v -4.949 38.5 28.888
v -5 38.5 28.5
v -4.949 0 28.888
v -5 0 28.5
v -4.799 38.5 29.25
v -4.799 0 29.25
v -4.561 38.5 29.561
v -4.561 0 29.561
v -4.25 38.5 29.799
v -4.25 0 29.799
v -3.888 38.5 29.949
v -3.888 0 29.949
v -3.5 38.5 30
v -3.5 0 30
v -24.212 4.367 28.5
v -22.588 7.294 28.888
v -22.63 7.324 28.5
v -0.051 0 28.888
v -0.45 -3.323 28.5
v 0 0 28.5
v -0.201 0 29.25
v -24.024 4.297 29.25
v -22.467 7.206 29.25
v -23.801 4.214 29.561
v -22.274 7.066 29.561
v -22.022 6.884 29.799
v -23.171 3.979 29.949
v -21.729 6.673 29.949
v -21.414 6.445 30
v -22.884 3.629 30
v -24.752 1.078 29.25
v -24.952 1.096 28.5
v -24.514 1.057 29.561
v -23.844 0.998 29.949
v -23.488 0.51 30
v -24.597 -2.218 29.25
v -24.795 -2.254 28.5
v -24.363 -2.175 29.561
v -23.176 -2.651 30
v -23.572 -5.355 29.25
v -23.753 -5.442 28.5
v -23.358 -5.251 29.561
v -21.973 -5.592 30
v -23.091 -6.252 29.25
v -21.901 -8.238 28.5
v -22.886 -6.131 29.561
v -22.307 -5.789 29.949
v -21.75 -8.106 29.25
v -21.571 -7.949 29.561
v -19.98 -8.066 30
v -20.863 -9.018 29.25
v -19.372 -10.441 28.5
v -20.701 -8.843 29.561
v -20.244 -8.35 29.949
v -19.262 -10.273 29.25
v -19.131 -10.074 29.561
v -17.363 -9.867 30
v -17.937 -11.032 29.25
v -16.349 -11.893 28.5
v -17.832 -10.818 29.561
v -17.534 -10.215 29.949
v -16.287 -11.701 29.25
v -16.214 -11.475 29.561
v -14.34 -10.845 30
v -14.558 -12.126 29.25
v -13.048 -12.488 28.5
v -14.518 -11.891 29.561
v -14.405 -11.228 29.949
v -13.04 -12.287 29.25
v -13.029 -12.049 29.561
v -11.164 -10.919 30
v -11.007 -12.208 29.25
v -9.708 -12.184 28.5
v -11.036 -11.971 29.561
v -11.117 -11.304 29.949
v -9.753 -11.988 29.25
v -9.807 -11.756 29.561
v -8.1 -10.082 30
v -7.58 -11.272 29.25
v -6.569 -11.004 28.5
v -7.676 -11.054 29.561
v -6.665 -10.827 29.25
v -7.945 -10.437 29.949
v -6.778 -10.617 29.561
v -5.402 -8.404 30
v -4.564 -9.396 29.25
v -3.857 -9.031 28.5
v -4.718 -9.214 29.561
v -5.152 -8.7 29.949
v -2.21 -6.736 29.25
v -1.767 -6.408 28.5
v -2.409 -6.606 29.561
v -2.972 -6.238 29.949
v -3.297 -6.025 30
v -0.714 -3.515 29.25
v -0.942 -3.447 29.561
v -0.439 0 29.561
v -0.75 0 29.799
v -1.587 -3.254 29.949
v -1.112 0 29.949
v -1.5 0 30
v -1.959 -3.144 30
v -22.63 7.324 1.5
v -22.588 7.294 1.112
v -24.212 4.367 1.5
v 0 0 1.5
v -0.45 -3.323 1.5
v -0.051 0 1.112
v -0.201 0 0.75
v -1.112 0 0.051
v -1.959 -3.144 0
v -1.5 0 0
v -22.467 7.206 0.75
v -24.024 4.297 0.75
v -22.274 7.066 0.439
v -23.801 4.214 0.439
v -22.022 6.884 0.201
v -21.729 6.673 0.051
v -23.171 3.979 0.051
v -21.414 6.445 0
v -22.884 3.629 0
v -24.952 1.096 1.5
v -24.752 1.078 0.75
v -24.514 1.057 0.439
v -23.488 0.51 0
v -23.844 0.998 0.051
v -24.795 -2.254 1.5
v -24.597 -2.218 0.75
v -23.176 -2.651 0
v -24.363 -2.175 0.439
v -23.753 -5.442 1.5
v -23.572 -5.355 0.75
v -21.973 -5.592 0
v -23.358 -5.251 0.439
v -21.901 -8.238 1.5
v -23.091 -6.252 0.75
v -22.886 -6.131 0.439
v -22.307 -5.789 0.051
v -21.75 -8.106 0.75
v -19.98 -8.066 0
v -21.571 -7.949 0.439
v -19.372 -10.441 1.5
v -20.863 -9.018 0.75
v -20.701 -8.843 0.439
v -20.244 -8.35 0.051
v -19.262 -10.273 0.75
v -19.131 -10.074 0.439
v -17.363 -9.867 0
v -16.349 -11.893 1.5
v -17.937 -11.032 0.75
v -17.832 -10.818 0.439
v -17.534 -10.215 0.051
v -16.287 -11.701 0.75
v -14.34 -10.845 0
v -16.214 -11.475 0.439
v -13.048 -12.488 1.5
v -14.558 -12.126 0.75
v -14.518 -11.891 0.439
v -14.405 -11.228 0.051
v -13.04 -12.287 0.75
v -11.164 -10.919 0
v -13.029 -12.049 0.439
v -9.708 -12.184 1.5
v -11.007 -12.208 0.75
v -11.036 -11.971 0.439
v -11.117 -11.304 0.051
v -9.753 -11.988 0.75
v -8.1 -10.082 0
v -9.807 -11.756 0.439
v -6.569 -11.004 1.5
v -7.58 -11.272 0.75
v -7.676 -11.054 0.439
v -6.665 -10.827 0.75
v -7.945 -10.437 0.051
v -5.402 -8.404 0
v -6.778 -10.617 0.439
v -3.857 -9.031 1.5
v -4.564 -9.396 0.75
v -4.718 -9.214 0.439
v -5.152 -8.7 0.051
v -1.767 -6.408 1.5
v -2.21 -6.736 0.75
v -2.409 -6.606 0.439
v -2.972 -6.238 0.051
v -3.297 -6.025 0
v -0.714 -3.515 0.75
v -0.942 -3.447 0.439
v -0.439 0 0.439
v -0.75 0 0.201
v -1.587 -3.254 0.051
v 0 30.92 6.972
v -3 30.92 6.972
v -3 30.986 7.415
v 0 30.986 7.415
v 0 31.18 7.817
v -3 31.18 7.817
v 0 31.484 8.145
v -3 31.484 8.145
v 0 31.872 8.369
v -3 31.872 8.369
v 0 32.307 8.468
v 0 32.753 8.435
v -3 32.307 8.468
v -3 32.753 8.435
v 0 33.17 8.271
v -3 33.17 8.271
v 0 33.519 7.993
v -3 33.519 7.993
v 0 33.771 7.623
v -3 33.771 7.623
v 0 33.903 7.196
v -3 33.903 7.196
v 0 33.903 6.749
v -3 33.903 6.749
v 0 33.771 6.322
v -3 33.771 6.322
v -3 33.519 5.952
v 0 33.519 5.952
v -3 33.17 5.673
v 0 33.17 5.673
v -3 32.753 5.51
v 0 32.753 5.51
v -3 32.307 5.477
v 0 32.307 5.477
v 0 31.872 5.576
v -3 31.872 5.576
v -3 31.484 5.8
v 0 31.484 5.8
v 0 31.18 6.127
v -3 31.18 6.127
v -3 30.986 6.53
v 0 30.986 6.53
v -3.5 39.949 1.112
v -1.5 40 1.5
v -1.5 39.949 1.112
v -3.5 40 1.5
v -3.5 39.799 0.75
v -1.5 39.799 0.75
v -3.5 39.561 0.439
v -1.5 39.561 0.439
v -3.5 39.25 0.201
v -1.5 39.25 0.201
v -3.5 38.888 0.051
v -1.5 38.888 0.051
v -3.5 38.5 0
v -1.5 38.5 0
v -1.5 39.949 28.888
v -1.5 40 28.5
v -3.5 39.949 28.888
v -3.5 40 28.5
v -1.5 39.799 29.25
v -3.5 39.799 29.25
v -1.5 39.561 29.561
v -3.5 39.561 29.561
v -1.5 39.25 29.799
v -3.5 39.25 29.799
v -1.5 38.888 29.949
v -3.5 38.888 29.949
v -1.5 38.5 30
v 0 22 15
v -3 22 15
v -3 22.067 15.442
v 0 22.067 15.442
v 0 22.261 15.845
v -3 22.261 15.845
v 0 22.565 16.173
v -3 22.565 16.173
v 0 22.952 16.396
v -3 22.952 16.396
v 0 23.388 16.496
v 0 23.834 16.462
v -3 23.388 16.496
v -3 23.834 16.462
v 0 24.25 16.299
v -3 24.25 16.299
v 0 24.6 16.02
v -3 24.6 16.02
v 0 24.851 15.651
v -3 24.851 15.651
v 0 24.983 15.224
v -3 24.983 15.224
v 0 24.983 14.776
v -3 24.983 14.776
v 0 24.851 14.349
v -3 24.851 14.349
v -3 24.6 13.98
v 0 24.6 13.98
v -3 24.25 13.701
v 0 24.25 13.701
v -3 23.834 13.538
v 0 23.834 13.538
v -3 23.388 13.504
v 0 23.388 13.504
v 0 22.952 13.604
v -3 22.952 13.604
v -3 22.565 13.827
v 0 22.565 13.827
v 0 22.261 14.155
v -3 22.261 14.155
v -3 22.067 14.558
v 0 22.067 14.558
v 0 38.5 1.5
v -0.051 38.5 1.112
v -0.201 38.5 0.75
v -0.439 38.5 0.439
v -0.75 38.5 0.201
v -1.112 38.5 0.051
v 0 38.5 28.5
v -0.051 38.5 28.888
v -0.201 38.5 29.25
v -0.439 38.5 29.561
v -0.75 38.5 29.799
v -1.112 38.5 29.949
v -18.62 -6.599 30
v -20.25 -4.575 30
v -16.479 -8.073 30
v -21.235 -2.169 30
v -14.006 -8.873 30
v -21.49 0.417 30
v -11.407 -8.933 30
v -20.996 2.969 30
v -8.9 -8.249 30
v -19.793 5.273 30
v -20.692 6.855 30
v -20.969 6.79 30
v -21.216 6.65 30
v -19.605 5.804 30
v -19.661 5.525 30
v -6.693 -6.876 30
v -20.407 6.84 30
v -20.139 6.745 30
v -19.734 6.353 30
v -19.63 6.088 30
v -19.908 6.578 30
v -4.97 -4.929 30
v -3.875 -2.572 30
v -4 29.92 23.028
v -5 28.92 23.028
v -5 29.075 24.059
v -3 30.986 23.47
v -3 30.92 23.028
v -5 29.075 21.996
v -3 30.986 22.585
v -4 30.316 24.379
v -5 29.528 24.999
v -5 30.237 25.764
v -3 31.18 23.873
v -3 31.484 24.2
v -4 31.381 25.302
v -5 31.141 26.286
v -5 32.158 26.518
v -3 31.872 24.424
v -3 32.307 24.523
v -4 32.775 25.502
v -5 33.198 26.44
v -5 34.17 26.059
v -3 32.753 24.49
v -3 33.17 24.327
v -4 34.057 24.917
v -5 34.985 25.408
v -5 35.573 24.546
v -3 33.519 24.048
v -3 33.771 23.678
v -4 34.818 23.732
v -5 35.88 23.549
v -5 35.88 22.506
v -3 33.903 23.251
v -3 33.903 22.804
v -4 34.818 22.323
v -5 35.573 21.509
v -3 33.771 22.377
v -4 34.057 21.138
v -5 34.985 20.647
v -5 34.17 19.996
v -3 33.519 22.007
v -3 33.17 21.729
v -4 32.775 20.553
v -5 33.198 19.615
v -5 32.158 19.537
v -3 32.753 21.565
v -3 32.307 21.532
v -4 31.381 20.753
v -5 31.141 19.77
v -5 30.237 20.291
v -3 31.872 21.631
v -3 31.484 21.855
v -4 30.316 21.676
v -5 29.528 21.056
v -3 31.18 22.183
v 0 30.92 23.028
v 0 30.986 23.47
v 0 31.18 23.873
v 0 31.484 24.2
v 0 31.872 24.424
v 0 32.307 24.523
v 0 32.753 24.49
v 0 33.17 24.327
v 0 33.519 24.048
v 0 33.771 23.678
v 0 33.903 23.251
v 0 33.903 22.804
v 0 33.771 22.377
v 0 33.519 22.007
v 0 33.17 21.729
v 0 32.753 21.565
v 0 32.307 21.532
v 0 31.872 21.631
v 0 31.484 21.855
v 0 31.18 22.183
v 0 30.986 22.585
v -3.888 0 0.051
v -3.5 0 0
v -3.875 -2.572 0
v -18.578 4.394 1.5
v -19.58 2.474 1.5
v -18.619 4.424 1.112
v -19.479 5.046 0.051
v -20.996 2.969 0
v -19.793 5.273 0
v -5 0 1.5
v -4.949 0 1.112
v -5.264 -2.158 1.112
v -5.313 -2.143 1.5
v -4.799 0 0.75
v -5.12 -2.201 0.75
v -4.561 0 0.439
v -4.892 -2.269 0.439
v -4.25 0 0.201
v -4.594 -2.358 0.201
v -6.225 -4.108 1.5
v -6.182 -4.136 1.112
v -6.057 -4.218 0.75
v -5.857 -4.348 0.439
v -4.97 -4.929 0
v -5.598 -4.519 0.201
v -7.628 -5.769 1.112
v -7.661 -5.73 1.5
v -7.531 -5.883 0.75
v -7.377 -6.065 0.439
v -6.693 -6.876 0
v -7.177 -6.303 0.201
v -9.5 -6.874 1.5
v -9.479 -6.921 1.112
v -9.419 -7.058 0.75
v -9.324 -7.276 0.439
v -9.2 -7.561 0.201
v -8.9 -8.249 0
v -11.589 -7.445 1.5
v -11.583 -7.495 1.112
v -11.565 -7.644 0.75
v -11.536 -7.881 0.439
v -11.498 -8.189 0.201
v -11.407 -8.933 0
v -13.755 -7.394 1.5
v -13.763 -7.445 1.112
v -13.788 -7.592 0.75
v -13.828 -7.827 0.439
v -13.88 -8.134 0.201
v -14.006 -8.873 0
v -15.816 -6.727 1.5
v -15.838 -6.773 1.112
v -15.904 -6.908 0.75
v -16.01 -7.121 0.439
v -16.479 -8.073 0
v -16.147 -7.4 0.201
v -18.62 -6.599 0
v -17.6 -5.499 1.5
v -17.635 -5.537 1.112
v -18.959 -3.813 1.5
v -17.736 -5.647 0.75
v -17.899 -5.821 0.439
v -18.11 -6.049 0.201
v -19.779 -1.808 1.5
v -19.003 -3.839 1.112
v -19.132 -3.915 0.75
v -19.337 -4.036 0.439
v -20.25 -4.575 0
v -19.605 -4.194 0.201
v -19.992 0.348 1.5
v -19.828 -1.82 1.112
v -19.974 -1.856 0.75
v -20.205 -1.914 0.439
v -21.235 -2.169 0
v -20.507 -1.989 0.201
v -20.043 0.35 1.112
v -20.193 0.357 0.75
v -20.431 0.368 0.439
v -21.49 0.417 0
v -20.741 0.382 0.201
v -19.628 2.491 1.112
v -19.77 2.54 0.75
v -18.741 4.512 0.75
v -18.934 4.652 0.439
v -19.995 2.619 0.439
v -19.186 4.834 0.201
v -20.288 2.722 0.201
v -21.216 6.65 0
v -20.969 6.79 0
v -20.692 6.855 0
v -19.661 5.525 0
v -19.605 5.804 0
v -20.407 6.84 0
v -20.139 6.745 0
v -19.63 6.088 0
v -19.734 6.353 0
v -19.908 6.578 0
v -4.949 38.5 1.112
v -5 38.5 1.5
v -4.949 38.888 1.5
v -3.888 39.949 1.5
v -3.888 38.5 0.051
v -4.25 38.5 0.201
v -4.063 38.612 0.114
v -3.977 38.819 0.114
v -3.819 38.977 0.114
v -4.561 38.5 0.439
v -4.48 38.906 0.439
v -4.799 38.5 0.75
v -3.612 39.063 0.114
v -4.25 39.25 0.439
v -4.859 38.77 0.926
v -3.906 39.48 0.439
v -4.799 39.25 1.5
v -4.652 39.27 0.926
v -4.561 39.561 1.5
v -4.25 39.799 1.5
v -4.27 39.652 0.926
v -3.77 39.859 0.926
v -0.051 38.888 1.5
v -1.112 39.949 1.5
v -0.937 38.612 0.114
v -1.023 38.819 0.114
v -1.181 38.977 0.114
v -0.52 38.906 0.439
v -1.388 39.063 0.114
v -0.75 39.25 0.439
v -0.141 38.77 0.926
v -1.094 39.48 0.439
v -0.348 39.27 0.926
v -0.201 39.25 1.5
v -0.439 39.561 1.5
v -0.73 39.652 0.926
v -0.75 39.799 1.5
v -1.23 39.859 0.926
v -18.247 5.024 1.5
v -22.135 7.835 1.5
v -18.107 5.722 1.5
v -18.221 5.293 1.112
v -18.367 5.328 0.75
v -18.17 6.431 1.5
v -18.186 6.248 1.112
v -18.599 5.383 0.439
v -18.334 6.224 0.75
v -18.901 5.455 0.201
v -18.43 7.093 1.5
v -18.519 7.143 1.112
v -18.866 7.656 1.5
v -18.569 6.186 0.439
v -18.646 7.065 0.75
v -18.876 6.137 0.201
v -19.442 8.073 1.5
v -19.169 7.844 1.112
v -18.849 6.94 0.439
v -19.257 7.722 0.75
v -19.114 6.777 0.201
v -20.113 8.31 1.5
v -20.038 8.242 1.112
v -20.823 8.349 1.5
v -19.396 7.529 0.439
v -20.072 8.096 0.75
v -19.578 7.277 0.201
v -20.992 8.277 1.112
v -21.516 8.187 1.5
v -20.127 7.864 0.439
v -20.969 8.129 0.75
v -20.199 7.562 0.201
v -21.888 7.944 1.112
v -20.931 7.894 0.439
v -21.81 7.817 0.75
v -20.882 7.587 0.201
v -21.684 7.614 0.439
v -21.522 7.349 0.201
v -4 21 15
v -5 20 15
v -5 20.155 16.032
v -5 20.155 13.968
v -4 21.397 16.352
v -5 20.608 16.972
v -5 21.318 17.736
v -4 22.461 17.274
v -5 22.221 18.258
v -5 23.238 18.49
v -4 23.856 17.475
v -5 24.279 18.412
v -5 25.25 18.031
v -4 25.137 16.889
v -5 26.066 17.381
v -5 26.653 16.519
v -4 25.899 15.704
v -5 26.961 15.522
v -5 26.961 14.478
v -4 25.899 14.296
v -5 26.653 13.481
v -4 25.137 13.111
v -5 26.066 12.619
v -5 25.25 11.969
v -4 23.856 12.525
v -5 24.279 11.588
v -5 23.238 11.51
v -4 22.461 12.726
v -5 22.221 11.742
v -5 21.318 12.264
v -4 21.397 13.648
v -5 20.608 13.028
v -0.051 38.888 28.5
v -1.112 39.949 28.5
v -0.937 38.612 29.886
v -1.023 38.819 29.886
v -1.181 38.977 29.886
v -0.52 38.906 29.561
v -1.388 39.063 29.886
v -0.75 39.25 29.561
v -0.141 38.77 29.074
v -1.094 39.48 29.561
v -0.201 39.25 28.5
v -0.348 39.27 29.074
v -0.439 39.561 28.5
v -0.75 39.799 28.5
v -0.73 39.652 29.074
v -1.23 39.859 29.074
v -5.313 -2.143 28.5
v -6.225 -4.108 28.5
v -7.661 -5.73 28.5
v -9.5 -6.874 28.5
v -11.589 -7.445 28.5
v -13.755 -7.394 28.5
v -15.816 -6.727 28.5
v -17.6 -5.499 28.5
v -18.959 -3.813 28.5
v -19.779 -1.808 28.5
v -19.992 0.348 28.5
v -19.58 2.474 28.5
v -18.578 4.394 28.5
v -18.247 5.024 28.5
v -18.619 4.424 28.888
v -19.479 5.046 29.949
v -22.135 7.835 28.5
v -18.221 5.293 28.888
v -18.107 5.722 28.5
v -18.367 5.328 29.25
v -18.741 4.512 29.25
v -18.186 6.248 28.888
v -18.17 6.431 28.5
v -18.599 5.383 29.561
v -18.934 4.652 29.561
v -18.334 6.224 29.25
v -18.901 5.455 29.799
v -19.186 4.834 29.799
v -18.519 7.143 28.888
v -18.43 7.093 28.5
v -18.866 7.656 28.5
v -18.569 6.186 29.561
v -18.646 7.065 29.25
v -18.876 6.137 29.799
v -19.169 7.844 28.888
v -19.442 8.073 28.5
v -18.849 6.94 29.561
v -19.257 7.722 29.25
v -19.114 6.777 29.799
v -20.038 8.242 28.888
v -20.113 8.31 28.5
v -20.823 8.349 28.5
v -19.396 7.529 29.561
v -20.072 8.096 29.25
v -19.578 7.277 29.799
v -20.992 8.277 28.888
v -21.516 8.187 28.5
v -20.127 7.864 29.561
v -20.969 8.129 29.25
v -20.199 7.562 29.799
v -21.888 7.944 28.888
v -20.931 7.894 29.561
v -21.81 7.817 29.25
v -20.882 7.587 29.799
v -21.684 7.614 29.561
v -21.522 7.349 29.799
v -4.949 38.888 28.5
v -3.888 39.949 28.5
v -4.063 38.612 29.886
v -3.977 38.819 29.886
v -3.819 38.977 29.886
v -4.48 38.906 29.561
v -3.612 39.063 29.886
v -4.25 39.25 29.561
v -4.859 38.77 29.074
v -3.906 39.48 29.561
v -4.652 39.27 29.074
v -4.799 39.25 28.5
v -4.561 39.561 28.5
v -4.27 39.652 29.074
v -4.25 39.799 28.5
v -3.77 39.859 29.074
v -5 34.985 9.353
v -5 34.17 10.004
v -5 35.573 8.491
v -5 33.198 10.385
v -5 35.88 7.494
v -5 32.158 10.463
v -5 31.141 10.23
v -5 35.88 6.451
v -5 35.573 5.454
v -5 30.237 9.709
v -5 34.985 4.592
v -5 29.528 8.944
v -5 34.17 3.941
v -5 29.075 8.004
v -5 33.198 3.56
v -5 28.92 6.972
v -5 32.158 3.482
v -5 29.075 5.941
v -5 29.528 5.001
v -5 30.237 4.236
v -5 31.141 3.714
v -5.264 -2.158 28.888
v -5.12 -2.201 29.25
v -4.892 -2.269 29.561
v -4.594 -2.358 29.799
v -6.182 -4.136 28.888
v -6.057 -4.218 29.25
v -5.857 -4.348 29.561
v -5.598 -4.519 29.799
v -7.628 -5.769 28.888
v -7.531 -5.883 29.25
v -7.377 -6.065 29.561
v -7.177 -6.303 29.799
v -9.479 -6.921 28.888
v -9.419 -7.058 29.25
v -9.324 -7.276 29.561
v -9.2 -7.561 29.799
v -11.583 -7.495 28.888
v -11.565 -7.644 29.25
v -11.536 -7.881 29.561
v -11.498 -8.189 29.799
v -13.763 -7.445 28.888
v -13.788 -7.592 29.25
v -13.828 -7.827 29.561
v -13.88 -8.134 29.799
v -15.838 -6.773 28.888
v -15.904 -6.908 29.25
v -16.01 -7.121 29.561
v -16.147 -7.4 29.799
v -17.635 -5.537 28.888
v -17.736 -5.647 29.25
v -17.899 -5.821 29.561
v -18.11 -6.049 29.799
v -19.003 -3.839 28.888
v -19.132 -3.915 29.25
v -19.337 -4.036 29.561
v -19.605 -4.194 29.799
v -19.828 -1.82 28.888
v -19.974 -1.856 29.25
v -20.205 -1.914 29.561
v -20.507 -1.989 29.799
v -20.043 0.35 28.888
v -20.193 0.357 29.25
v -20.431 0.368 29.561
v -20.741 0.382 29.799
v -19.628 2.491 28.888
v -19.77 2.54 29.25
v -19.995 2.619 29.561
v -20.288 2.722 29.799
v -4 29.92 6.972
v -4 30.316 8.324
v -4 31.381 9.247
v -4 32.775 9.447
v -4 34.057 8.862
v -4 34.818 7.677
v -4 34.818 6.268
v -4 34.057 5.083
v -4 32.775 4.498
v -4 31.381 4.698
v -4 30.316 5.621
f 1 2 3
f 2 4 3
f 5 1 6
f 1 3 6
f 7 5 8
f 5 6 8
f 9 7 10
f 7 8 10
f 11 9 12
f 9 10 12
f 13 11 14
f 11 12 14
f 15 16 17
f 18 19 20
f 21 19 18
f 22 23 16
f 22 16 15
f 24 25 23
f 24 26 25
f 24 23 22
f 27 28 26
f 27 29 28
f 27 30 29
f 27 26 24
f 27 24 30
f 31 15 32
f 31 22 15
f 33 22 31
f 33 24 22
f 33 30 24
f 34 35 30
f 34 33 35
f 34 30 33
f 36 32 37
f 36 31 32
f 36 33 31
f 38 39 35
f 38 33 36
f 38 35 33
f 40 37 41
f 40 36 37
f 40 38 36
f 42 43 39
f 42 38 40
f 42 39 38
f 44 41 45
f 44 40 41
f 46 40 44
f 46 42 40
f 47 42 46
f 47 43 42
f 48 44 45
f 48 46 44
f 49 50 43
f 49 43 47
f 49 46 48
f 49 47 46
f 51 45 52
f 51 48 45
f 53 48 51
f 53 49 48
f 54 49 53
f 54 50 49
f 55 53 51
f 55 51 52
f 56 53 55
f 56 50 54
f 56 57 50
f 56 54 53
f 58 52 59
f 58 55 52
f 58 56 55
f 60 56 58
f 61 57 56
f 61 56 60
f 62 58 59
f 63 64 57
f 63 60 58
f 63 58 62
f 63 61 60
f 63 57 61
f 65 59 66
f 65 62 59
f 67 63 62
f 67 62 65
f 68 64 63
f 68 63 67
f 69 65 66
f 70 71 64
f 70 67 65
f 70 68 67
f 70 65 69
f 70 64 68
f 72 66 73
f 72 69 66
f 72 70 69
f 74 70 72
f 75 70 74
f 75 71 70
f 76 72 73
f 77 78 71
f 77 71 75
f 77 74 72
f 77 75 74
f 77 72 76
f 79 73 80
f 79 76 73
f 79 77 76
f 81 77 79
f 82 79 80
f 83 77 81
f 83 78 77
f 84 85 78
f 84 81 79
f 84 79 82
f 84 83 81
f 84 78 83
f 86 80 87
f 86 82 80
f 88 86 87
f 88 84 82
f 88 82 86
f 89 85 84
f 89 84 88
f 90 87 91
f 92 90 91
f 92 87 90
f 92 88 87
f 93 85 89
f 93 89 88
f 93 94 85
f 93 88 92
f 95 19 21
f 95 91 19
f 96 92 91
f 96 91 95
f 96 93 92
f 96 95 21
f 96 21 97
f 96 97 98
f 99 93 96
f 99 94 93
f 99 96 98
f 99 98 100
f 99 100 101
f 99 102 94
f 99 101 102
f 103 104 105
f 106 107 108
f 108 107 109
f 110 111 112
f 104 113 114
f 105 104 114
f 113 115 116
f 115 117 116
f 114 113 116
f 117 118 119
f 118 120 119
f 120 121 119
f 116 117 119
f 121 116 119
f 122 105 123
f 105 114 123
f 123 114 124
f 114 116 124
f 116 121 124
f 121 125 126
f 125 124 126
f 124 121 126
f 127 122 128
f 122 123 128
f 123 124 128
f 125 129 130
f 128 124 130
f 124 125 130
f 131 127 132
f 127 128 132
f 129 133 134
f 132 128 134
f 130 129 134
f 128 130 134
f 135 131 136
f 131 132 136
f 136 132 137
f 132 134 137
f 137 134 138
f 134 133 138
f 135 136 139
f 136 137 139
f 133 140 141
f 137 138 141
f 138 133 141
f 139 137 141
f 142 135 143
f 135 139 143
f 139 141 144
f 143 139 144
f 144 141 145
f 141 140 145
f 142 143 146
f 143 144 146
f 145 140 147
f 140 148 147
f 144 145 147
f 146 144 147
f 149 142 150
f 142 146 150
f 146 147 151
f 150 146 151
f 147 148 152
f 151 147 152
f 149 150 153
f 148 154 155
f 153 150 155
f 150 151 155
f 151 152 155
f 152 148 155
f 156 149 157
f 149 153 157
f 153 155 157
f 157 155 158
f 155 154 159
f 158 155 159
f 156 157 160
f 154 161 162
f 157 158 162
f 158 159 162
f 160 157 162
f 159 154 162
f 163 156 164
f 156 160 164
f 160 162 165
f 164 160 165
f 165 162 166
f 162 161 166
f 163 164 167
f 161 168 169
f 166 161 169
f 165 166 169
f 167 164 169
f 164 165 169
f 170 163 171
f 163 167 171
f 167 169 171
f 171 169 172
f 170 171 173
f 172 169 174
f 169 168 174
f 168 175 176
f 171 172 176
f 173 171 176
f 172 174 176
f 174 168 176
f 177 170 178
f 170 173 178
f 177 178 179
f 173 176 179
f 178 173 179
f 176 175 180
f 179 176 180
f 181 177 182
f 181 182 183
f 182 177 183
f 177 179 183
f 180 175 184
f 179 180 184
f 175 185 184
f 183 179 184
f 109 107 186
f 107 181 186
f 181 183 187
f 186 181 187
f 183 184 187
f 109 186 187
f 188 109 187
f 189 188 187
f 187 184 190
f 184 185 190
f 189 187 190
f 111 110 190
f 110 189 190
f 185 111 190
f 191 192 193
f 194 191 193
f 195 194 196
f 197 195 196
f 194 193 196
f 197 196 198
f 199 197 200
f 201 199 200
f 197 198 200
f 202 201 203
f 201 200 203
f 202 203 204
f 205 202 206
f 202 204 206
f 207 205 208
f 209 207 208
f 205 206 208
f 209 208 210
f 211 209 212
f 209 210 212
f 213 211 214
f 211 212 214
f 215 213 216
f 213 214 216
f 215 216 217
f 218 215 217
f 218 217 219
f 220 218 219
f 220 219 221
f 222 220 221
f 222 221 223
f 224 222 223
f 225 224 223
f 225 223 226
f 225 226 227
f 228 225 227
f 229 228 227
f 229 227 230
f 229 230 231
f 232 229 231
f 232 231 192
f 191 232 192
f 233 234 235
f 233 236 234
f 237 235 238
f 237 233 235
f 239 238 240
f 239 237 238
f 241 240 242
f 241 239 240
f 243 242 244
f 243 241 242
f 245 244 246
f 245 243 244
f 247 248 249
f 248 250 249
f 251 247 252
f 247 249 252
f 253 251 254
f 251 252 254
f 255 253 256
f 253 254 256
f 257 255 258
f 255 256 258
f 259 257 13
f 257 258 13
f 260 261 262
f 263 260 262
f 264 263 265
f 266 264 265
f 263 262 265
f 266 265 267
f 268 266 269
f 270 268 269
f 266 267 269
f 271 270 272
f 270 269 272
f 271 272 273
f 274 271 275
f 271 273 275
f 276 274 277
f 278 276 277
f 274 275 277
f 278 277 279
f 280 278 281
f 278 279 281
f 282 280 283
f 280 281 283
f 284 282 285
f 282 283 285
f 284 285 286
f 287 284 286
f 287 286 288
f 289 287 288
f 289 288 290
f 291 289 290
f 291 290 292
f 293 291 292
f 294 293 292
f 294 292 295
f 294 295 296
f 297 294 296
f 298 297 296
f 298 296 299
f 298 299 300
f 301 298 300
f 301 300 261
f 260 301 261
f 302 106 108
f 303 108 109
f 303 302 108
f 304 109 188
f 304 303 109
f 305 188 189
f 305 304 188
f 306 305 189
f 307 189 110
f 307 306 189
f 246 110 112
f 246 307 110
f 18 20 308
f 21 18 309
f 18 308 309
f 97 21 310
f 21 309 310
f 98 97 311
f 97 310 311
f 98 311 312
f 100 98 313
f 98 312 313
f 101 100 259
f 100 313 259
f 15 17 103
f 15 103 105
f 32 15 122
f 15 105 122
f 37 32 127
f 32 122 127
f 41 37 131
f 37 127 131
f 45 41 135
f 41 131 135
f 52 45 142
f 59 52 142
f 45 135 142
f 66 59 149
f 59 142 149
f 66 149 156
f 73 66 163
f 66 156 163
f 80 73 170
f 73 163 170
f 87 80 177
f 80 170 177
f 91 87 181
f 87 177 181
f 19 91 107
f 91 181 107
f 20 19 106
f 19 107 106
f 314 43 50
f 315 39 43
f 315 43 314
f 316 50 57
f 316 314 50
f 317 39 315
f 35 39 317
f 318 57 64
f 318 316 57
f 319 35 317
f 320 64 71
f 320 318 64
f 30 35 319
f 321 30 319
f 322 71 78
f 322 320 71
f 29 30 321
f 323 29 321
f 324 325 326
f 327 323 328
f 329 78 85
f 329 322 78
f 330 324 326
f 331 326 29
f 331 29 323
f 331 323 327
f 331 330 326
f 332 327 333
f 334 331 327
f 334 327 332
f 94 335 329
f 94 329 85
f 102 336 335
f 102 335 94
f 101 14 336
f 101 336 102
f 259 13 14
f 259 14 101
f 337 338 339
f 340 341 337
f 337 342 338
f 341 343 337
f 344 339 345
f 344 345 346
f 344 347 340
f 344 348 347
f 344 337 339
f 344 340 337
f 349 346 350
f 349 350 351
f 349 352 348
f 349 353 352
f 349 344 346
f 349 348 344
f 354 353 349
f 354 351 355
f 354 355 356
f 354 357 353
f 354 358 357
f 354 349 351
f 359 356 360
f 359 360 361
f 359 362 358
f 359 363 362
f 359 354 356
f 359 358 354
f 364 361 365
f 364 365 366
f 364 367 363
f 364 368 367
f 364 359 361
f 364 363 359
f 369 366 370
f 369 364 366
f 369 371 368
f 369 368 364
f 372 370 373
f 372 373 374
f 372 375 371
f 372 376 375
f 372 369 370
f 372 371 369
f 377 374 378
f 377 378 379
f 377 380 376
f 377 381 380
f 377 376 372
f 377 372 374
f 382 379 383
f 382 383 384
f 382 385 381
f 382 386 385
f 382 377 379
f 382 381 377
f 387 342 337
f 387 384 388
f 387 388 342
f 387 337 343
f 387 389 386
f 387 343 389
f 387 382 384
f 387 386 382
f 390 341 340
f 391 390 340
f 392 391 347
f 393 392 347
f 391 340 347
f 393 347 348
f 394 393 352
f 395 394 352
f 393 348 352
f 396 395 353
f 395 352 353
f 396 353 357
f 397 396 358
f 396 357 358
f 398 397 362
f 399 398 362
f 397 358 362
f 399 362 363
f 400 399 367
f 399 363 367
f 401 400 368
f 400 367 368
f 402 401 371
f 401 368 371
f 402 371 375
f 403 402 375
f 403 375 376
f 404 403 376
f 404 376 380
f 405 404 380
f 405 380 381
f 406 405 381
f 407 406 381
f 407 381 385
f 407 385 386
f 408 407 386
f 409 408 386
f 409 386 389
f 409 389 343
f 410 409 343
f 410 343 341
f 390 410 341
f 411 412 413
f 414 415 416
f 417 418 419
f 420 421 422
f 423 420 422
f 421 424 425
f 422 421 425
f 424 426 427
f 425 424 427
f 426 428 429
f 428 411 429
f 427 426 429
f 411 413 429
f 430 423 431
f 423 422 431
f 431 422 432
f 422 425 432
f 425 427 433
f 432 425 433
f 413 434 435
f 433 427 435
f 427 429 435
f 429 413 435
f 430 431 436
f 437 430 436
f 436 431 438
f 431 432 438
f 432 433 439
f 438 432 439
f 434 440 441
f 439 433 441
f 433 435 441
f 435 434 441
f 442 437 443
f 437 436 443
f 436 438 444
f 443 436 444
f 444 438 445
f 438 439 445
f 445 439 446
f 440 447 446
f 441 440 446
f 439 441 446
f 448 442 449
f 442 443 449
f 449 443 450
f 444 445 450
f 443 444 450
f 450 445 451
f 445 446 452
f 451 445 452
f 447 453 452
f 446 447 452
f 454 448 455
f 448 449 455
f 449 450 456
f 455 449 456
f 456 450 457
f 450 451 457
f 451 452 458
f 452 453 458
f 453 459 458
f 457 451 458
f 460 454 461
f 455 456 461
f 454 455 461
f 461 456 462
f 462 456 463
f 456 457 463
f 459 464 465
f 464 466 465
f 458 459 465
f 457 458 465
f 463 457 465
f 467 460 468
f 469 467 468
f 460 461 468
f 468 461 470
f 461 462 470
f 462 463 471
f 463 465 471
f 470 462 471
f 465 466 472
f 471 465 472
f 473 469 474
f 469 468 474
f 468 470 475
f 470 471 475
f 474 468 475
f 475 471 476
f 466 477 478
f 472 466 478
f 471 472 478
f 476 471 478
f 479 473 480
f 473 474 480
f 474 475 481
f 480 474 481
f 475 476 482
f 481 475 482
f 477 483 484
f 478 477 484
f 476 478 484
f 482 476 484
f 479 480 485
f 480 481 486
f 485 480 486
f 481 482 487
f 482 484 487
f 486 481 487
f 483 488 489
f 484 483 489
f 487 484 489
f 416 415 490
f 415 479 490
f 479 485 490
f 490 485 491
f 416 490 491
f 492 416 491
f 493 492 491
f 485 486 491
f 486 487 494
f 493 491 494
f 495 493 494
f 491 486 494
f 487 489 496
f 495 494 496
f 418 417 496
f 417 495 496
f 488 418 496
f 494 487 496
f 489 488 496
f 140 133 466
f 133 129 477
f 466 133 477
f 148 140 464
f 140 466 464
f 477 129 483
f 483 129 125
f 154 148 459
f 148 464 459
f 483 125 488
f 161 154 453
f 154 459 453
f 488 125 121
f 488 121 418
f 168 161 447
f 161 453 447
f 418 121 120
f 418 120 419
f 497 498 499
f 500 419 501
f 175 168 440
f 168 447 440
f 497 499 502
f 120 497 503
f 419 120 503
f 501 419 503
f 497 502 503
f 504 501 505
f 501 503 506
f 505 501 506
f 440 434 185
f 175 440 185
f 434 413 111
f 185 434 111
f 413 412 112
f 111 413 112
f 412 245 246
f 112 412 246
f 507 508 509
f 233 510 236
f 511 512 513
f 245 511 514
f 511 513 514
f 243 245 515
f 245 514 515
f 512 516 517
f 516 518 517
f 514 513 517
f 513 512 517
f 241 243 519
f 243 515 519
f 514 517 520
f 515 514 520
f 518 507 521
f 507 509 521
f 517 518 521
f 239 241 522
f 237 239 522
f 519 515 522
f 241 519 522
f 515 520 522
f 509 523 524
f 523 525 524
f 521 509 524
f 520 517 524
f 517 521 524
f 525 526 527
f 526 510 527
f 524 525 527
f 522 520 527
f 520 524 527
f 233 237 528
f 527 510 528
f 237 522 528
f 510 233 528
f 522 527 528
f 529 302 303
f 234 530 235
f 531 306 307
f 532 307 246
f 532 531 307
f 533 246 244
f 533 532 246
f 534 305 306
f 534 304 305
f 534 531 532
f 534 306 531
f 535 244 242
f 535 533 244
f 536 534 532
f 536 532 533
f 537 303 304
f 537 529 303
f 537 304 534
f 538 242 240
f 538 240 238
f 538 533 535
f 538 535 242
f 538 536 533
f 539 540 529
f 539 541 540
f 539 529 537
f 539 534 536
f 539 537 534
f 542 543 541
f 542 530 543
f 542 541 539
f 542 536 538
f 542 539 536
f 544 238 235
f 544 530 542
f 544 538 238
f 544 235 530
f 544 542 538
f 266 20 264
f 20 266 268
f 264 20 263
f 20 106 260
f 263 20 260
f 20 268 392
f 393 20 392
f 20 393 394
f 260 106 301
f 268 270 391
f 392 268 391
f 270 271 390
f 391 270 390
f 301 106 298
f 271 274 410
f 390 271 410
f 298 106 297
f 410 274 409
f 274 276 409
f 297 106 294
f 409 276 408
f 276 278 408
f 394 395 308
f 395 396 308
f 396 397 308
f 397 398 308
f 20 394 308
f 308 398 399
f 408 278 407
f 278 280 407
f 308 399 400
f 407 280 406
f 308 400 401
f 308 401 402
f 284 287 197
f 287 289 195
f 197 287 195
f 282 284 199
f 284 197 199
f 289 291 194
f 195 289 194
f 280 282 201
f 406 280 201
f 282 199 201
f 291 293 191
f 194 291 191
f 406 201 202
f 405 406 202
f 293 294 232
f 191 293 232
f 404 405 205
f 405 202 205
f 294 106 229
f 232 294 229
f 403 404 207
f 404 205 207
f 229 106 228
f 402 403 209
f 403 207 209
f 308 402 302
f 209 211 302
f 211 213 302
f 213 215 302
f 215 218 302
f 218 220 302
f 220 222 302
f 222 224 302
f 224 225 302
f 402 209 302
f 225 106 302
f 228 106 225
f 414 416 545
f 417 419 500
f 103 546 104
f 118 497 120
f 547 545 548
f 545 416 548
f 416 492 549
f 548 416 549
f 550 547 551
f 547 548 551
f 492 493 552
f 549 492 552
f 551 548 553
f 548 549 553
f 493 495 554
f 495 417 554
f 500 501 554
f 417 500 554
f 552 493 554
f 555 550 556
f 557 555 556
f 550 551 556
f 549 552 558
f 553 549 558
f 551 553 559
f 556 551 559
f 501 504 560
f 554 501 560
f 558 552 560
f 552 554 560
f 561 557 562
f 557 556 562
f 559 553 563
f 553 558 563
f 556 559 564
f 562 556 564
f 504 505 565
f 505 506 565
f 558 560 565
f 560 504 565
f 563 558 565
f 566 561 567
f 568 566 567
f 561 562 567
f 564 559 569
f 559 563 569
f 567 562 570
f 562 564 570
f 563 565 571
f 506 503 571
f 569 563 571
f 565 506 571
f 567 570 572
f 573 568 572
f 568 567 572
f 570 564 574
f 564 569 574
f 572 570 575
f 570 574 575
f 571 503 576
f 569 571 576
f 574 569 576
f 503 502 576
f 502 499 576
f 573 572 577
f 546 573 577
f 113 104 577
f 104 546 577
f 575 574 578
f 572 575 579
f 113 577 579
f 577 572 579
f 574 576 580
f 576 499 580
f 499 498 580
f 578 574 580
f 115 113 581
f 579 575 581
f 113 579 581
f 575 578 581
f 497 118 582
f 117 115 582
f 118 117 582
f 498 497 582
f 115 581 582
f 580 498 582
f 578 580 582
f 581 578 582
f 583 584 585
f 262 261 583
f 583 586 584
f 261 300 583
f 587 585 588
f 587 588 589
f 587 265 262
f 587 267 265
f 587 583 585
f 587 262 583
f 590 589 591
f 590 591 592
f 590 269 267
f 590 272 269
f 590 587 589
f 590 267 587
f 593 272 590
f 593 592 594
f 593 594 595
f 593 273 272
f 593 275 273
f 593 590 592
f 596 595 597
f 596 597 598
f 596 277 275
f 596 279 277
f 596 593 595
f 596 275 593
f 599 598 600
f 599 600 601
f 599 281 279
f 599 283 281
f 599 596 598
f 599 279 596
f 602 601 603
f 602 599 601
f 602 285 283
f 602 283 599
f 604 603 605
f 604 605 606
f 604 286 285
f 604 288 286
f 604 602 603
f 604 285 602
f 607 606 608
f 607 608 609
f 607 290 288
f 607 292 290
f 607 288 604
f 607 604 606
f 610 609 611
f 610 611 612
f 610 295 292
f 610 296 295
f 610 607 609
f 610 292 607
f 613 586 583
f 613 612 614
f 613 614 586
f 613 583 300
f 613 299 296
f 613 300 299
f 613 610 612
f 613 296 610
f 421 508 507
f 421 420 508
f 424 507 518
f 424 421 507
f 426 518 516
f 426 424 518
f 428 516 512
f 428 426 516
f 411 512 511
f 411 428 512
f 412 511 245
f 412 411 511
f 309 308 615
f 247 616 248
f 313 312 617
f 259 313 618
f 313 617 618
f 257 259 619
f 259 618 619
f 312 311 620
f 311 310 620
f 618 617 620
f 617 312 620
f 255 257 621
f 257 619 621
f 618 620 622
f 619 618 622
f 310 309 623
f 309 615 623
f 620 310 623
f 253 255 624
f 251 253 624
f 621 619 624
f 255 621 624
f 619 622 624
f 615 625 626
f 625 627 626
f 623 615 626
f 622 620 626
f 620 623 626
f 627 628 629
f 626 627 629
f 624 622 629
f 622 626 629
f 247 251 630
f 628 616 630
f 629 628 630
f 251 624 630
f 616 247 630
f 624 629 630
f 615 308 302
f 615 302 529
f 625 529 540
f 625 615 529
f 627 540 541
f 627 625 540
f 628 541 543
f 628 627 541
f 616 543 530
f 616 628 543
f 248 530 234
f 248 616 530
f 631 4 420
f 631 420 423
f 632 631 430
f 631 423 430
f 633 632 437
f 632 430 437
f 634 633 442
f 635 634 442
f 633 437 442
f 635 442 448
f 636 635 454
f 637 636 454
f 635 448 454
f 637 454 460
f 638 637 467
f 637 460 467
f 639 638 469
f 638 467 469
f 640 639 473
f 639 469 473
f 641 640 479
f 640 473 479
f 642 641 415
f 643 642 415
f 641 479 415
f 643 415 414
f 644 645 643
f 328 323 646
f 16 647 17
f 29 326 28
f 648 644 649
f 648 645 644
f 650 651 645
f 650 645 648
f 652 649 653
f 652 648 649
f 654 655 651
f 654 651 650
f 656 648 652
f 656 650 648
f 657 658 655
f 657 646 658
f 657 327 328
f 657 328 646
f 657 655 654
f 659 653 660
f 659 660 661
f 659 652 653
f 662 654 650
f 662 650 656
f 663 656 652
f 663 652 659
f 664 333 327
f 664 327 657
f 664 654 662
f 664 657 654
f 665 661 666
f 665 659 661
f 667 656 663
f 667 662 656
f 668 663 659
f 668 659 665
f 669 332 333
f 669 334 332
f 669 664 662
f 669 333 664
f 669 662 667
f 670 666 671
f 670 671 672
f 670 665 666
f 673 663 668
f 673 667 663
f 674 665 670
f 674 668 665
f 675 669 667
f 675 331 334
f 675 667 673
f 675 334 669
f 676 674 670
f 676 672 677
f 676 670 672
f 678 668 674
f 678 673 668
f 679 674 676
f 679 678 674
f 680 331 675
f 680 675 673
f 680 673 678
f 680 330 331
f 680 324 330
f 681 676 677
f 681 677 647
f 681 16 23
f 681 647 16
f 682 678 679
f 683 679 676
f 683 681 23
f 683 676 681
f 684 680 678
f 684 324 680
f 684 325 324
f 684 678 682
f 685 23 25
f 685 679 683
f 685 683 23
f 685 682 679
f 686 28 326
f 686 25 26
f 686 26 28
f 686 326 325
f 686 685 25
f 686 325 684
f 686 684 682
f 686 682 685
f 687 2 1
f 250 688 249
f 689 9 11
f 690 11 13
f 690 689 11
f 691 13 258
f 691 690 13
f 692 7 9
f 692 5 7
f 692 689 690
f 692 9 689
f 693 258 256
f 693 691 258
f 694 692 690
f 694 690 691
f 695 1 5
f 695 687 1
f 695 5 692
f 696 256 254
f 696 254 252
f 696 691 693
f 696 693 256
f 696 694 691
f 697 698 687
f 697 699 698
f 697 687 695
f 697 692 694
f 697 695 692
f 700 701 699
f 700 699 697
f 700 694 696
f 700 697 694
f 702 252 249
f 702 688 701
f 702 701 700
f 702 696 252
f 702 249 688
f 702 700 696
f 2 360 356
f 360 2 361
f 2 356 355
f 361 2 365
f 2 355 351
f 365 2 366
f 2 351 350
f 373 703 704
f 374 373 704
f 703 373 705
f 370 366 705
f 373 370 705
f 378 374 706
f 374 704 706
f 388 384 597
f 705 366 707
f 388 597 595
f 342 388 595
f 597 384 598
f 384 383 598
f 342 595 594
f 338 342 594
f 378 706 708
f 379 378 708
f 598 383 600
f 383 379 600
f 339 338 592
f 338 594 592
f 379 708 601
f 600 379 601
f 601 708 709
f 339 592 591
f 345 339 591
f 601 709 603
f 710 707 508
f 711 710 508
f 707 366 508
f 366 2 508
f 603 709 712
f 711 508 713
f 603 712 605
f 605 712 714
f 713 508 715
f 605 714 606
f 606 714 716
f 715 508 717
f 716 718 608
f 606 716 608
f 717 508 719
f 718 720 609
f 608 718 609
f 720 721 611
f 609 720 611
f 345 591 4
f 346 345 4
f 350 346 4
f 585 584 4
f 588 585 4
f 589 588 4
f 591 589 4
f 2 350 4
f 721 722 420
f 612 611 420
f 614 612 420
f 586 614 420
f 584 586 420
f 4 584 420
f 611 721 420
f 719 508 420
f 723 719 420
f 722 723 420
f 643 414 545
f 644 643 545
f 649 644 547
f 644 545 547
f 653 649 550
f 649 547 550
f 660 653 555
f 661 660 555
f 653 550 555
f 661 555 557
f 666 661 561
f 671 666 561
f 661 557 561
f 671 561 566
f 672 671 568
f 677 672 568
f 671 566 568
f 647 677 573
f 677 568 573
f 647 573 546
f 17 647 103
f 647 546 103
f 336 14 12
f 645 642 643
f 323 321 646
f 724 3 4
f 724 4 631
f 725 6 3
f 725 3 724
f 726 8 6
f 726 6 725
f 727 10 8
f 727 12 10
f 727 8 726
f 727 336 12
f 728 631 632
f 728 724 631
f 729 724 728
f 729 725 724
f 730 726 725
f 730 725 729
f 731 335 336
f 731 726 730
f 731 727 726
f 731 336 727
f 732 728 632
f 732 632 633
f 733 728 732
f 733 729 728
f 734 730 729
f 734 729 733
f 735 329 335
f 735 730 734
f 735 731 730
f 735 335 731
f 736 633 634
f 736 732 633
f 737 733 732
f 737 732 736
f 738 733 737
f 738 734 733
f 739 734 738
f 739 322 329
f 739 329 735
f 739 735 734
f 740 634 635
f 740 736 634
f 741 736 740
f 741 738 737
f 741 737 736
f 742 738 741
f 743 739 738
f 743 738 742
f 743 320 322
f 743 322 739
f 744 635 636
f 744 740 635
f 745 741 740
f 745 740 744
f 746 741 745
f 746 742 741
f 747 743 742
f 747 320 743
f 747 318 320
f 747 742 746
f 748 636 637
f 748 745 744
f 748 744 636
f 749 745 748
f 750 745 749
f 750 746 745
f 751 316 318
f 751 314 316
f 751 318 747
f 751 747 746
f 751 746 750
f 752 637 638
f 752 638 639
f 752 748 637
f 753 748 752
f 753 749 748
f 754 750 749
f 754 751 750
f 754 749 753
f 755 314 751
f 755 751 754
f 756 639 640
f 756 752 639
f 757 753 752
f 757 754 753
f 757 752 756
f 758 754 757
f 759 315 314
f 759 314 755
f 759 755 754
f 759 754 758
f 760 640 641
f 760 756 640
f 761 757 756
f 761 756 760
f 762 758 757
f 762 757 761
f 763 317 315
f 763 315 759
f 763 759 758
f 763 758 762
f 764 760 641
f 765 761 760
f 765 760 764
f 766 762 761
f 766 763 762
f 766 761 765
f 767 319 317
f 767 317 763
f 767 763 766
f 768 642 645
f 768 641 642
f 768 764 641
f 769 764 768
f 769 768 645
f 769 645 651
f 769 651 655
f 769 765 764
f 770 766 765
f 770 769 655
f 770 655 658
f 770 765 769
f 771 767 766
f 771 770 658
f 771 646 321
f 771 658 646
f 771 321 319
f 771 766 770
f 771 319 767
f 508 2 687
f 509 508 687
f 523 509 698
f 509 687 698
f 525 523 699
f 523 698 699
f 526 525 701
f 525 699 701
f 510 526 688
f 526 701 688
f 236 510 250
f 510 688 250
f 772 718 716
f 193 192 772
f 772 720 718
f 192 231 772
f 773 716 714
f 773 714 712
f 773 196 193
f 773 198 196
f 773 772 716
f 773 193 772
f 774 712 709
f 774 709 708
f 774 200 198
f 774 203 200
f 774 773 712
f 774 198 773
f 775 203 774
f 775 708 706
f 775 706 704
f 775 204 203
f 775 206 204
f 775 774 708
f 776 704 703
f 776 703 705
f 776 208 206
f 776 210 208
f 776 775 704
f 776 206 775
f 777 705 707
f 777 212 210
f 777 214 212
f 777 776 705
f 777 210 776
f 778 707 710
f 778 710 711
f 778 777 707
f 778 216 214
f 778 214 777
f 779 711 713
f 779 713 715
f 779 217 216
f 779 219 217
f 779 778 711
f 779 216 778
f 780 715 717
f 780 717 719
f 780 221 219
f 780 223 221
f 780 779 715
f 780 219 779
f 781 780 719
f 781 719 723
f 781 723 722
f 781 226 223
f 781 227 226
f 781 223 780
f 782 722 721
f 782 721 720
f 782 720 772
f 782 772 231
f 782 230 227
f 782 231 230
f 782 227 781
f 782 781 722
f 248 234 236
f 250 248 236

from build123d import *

# Parameters (mm, degrees)
F1_DEPTH      = 30
F2_R          = 1.5
F3_R          = 1.5
F4_DEPTH      = 25
F4_DEPTH_BACK = 25
F5_SIZE       = 2


# Not quite as in the source:
# - a feature names something its author has since deleted; it is built from what else it names


with BuildPart() as f1:
    # F0 (on Top) → F1 (new body)
    with BuildSketch(Plane.XY):
        with BuildLine():
            Line((-5, 40), (-5, 0))
            ThreePointArc((-5, 0), (-14.8093771881, -7.1355992743), (-18.5778072009, 4.3943440499))
            ThreePointArc((-18.5778072009, 4.3943440499), (-19.1389615845, 7.8850611335), (-22.6296786681, 7.3239067498))
            ThreePointArc((-22.6296786681, 7.3239067498), (-16.3489619801, -11.8926654572), (0, 0))
            Line((0, 0), (0, 40))
            Line((0, 40), (-5, 40))
        make_face()
    extrude(amount=F1_DEPTH)

    # F2
    f2_edges = [f1.edges().sort_by_distance(p)[0] for p in [
        (-5, 40, 15),
        (0, 40, 15),
        (-16.348962, -11.892665, 0),
        (-16.348962, -11.892665, 30),
        (0, 20, 0),
        (-14.809377, -7.135599, 0),
        (-14.809377, -7.135599, 30),
        (-5, 20, 0),
        (-18.577807, 4.394344, 15),
        (-5, 20, 30),
        (-2.5, 40, 0),
        (0, 0, 15),
        (-22.629679, 7.323907, 15),
        (-2.5, 40, 30),
        (0, 20, 30),
        (-19.138962, 7.885061, 0),
        (-19.138962, 7.885061, 30),
    ]]
    fillet(f2_edges, radius=F2_R)

    # F3 (on face) → F4 (cut, two sides)
    with BuildSketch(Plane(origin=(-5, 0, 0), x_dir=(0, -1, 0), z_dir=(-1, 0, 0))) as f4_sk:
        with Locations((-23.5, 15)):
            Circle(F3_R)
        with Locations((-32.419529755, 23.0275767795)):
            Circle(F3_R)
        with Locations((-32.419529755, 6.9724232205)):
            Circle(F3_R)
    extrude(amount=F4_DEPTH, mode=Mode.SUBTRACT)
    extrude(f4_sk.sketch, amount=-F4_DEPTH_BACK, mode=Mode.SUBTRACT)

    # F5
    f5_edges = [f1.edges().sort_by_distance(p)[0] for p in [
        (-5, 33.91953, 6.972423),
        (-5, 33.91953, 23.027577),
        (-5, 25, 15),
    ]]
    chamfer(f5_edges, length=F5_SIZE)


solid = f1.part
